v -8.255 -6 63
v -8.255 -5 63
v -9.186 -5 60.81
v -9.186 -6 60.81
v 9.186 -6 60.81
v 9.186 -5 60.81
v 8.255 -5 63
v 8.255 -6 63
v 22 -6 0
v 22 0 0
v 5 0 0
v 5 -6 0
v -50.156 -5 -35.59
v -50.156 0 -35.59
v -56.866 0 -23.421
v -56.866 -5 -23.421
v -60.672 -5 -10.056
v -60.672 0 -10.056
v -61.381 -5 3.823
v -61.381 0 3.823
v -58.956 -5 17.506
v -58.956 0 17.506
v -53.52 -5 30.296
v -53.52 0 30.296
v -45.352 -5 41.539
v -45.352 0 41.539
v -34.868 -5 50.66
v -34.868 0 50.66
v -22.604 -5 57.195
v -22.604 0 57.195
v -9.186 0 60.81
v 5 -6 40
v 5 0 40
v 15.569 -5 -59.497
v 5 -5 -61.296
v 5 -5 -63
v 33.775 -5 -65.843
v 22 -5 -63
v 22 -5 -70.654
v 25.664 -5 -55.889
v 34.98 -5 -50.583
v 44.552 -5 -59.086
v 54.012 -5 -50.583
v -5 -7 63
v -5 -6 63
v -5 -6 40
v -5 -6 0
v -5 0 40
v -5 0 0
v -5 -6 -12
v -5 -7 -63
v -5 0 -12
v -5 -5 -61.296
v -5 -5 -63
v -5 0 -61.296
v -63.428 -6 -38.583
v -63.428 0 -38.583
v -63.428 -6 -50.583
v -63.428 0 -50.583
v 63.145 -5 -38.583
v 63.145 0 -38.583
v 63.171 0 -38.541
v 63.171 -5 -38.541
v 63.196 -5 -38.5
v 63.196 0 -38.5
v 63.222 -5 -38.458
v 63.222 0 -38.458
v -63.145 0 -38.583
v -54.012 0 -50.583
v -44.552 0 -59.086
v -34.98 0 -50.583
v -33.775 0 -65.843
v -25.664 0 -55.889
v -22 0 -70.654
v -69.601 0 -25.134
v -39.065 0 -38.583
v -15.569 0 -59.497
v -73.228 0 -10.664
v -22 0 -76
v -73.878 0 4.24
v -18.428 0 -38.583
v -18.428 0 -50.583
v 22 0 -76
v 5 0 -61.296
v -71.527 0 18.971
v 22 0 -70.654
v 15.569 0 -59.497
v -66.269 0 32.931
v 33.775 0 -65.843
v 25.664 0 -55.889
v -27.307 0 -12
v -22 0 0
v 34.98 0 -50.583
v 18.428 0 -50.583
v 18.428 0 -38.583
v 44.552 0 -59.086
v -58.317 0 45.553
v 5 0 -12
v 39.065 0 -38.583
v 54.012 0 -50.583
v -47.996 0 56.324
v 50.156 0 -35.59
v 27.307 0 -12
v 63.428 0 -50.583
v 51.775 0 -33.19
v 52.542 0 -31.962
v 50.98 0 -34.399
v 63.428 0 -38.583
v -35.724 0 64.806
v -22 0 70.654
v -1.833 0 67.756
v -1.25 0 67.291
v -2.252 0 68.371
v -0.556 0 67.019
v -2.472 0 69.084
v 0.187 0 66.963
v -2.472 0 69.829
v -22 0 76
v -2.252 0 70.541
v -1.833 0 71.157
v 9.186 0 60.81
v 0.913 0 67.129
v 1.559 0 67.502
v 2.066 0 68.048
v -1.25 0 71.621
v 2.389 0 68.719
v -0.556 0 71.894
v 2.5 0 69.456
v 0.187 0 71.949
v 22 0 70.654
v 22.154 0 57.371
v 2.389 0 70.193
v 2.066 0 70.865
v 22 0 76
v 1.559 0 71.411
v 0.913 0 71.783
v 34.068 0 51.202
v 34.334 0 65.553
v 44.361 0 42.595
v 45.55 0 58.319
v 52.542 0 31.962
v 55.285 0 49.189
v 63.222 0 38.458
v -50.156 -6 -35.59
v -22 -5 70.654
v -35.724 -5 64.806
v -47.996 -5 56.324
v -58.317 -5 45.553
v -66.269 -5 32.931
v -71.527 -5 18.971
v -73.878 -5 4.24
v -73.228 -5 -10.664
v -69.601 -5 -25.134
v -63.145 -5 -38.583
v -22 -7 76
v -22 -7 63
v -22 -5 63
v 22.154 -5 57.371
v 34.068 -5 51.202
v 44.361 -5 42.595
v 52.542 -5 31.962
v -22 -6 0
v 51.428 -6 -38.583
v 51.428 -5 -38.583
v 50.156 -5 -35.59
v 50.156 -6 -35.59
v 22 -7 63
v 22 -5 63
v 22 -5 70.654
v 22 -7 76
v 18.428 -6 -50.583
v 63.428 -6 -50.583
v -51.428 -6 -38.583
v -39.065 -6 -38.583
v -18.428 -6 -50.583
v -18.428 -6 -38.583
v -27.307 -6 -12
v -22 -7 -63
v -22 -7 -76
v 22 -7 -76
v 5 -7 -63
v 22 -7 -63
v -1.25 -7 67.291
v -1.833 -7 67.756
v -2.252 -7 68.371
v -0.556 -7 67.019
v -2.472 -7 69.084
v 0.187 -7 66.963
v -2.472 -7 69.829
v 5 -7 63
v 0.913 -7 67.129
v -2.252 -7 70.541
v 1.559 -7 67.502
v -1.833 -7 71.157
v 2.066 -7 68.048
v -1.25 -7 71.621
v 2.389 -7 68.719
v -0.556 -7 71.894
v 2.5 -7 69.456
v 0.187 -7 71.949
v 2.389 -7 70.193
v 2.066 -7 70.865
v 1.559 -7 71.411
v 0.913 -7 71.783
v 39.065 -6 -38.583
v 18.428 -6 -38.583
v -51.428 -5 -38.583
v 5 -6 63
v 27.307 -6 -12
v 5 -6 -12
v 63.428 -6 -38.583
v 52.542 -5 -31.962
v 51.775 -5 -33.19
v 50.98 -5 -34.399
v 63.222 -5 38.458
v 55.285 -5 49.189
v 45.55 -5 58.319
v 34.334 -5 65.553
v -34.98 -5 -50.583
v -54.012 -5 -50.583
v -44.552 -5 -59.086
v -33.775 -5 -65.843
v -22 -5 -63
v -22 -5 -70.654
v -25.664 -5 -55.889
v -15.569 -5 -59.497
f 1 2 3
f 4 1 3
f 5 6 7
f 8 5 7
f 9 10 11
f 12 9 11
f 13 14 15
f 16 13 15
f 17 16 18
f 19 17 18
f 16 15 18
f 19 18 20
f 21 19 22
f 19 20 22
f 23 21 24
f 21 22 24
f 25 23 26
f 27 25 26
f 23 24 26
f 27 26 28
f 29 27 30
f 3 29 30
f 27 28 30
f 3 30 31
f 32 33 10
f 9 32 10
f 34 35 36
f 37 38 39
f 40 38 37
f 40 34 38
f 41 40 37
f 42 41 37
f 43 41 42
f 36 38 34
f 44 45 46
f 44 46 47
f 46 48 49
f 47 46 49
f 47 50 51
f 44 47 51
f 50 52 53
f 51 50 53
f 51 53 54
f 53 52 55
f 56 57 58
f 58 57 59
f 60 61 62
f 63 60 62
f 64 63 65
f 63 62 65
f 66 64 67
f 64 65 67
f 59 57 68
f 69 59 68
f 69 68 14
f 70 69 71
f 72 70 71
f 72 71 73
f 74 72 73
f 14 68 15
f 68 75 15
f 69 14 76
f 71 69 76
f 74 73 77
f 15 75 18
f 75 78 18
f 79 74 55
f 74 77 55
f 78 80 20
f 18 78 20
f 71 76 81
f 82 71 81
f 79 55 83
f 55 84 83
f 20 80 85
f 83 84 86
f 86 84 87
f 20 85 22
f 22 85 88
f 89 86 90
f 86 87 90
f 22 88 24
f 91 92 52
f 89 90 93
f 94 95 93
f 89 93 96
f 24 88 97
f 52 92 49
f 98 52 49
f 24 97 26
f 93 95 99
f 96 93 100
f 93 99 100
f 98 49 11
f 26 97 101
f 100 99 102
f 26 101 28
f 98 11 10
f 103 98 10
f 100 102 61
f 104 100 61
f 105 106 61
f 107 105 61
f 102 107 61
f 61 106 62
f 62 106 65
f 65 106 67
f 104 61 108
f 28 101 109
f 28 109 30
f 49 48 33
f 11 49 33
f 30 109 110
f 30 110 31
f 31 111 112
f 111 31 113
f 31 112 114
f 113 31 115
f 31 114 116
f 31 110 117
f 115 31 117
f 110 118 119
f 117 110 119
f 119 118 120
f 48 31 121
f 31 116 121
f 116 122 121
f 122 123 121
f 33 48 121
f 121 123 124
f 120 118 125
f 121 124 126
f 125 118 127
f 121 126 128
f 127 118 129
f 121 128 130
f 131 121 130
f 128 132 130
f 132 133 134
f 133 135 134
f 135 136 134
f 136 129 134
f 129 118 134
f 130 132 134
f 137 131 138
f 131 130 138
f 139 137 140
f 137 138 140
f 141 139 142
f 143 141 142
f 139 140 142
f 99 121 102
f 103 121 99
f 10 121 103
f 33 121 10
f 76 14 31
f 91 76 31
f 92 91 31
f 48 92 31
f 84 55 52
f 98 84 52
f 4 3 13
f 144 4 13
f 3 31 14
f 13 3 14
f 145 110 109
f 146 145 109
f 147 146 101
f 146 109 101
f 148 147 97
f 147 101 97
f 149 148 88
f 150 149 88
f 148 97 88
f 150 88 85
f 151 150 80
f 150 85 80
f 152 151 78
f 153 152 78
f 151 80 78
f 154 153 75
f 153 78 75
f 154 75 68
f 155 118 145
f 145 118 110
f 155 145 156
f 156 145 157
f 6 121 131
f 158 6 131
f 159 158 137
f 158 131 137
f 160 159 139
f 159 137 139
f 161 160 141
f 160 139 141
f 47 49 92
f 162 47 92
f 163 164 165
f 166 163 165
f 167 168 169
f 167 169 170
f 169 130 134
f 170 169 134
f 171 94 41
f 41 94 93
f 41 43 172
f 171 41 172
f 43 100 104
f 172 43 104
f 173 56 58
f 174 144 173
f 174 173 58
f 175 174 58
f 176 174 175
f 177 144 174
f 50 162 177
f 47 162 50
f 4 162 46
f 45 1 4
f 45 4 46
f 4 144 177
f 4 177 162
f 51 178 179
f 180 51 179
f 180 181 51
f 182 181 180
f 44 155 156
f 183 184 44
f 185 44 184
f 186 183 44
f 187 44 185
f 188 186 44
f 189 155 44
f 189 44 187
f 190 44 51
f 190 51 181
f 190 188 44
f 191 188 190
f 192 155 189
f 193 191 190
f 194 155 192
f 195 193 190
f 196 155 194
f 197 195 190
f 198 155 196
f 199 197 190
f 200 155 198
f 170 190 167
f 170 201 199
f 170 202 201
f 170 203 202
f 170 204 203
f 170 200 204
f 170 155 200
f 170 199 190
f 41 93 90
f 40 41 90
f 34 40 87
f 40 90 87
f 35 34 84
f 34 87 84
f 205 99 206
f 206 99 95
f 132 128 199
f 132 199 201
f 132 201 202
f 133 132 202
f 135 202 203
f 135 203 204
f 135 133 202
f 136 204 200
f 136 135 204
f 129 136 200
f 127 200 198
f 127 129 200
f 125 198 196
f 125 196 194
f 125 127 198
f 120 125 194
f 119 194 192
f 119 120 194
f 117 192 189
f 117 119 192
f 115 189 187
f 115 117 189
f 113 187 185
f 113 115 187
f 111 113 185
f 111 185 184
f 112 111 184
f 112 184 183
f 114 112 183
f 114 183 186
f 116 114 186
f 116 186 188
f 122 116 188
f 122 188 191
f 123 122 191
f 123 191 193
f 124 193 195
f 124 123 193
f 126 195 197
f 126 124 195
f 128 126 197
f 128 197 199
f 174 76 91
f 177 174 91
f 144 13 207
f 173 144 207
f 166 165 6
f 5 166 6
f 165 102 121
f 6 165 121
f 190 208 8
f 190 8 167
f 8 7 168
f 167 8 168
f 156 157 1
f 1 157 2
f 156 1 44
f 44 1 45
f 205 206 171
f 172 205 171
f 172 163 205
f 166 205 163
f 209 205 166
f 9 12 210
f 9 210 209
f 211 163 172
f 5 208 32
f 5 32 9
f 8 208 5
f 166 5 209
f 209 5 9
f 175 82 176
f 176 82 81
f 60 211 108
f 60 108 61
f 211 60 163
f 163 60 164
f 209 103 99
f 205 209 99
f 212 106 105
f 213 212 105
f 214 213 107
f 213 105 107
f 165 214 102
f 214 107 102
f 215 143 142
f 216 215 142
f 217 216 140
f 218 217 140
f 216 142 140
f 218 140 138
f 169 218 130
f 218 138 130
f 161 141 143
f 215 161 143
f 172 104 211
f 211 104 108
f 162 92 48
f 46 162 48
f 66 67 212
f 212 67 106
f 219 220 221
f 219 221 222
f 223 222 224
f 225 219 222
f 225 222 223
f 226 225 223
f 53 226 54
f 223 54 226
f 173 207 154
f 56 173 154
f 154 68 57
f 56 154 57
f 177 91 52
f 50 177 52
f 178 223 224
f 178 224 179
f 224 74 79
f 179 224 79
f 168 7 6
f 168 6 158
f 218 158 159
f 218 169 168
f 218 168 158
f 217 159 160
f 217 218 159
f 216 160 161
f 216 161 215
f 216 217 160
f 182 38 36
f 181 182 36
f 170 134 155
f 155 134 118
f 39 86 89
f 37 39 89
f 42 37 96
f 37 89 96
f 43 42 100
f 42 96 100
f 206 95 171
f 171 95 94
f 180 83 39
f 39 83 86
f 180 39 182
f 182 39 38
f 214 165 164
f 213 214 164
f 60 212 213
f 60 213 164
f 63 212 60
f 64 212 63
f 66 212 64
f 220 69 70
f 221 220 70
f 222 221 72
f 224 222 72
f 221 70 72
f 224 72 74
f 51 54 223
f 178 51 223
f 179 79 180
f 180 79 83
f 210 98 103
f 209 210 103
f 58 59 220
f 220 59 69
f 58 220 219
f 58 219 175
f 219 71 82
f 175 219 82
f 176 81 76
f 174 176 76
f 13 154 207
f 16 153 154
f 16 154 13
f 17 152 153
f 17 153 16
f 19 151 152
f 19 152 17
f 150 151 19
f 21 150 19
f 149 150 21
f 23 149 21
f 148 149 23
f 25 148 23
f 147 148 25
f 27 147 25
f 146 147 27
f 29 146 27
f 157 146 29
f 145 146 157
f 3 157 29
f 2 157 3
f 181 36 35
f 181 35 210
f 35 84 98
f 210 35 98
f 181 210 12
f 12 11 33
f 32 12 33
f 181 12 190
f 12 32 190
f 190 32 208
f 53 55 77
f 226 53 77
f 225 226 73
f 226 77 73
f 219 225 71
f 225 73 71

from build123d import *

# Parameters (mm, degrees)
F0_R     = 2.5
F1_DEPTH = 7
F2_DEPTH = 6
F3_DEPTH = 5


with BuildPart() as f1:
    # F0 (on Front) → F1 (new body)
    with BuildSketch(Plane.XZ):
        Polygon((-22, -76), (0, -76), (22, -76), (22, -70.6540869306), (22, -63), (5, -63), (5, -61.2964109879), (5, -11.9999500107), (5, 0), (5, 40), (5, 63), (8.2548681714, 63), (22, 63), (22, 70.6540869306), (22, 76), (0, 76), (-22, 76), (-22, 70.6540869306), (-22, 63), (-8.2548681714, 63), (-5, 63), (-5, 40), (-5, 0), (-5, -11.9999500107), (-5, -61.2964109879), (-5, -63), (-22, -63), (-22, -70.6540869306), align=None)
        with Locations((0, 69.456204772)):
            Circle(F0_R, mode=Mode.SUBTRACT)
    extrude(amount=F1_DEPTH)

    # F0 (on Front) → F2 (join)
    with BuildSketch(Plane.XZ):
        Polygon((34.9798961949, -50.5831677754), (54.0124350294, -50.5831677754), (63.4277144759, -50.5831677754), (63.4277144759, -38.5831677754), (63.1453811804, -38.5831677754), (51.4277144759, -38.5831677754), (50.1556774178, -35.5901394035), (34.9998075814, 0.0707307999), (9.185549765, 60.8101609562), (8.2548681714, 63), (5, 63), (5, 40), (22, 0), (5, 0), (5, -11.9999500107), (27.307384864, -11.9999500107), (39.0647144759, -38.5831677754), (18.4277144759, -38.5831677754), (18.4277144759, -50.5831677754), align=None)
        Polygon((-63.4277144759, -50.5831677754), (-54.0124350294, -50.5831677754), (-34.9798961949, -50.5831677754), (-18.4277144759, -50.5831677754), (-18.4277144759, -38.5831677754), (-39.0647144759, -38.5831677754), (-27.307384864, -11.9999500107), (-5, -11.9999500107), (-5, 0), (-22, 0), (-5, 40), (-5, 63), (-8.2548681714, 63), (-9.185549765, 60.8101609562), (-34.9998075814, 0.0707307999), (-50.1556774178, -35.5901394035), (-51.4277144759, -38.5831677754), (-63.1453811804, -38.5831677754), (-63.4277144759, -38.5831677754), align=None)
    extrude(amount=F2_DEPTH)

    # F0 (on Front) → F3 (join)
    with BuildSketch(Plane.XZ):
        with BuildLine():
            Line((22, 63), (8.2548681714, 63))
            Line((8.2548681714, 63), (9.185549765, 60.8101609562))
            ThreePointArc((9.185549765, 60.8101609562), (34.068237255, 51.2016133568), (52.542409199, 31.9616212912))
            Line((52.542409199, 31.9616212912), (63.2217606622, 38.4578857813))
            ThreePointArc((63.2217606622, 38.4578857813), (45.5503673388, 58.3194996146), (22, 70.6540869306))
            Line((22, 70.6540869306), (22, 63))
        make_face()
        with BuildLine():
            ThreePointArc((-22, 70.6540869306), (-69.2504760851, 26.0839330237), (-63.1453811804, -38.5831677754))
            Line((-63.1453811804, -38.5831677754), (-51.4277144759, -38.5831677754))
            Line((-51.4277144759, -38.5831677754), (-50.1556774178, -35.5901394035))
            ThreePointArc((-50.1556774178, -35.5901394035), (-56.6003514852, 24.0551493812), (-9.185549765, 60.8101609562))
            Line((-9.185549765, 60.8101609562), (-8.2548681714, 63))
            Line((-8.2548681714, 63), (-22, 63))
            Line((-22, 63), (-22, 70.6540869306))
        make_face()
        with BuildLine():
            ThreePointArc((-54.0124350294, -50.5831677754), (-39.3088160431, -62.6962278075), (-22, -70.6540869306))
            Line((-22, -70.6540869306), (-22, -63))
            Line((-22, -63), (-5, -63))
            Line((-5, -63), (-5, -61.2964109879))
            ThreePointArc((-5, -61.2964109879), (-20.6952028251, -57.9133713406), (-34.9798961949, -50.5831677754))
            Line((-34.9798961949, -50.5831677754), (-54.0124350294, -50.5831677754))
        make_face()
        with BuildLine():
            Line((22, -63), (22, -70.6540869306))
            ThreePointArc((22, -70.6540869306), (39.3088160431, -62.6962278075), (54.0124350294, -50.5831677754))
            Line((54.0124350294, -50.5831677754), (34.9798961949, -50.5831677754))
            ThreePointArc((34.9798961949, -50.5831677754), (20.6952028251, -57.9133713406), (5, -61.2964109879))
            Line((5, -61.2964109879), (5, -63))
            Line((5, -63), (22, -63))
        make_face()
        with BuildLine():
            Line((51.4277144759, -38.5831677754), (63.1453811804, -38.5831677754))
            ThreePointArc((63.1453811804, -38.5831677754), (63.1836019728, -38.5205457093), (63.2217606622, -38.4578857813))
            Line((63.2217606622, -38.4578857813), (52.542409199, -31.9616212912))
            ThreePointArc((52.542409199, -31.9616212912), (51.3810839182, -33.7969557118), (50.1556774178, -35.5901394035))
            Line((50.1556774178, -35.5901394035), (51.4277144759, -38.5831677754))
        make_face()
    extrude(amount=F3_DEPTH)


solid = f1.part
